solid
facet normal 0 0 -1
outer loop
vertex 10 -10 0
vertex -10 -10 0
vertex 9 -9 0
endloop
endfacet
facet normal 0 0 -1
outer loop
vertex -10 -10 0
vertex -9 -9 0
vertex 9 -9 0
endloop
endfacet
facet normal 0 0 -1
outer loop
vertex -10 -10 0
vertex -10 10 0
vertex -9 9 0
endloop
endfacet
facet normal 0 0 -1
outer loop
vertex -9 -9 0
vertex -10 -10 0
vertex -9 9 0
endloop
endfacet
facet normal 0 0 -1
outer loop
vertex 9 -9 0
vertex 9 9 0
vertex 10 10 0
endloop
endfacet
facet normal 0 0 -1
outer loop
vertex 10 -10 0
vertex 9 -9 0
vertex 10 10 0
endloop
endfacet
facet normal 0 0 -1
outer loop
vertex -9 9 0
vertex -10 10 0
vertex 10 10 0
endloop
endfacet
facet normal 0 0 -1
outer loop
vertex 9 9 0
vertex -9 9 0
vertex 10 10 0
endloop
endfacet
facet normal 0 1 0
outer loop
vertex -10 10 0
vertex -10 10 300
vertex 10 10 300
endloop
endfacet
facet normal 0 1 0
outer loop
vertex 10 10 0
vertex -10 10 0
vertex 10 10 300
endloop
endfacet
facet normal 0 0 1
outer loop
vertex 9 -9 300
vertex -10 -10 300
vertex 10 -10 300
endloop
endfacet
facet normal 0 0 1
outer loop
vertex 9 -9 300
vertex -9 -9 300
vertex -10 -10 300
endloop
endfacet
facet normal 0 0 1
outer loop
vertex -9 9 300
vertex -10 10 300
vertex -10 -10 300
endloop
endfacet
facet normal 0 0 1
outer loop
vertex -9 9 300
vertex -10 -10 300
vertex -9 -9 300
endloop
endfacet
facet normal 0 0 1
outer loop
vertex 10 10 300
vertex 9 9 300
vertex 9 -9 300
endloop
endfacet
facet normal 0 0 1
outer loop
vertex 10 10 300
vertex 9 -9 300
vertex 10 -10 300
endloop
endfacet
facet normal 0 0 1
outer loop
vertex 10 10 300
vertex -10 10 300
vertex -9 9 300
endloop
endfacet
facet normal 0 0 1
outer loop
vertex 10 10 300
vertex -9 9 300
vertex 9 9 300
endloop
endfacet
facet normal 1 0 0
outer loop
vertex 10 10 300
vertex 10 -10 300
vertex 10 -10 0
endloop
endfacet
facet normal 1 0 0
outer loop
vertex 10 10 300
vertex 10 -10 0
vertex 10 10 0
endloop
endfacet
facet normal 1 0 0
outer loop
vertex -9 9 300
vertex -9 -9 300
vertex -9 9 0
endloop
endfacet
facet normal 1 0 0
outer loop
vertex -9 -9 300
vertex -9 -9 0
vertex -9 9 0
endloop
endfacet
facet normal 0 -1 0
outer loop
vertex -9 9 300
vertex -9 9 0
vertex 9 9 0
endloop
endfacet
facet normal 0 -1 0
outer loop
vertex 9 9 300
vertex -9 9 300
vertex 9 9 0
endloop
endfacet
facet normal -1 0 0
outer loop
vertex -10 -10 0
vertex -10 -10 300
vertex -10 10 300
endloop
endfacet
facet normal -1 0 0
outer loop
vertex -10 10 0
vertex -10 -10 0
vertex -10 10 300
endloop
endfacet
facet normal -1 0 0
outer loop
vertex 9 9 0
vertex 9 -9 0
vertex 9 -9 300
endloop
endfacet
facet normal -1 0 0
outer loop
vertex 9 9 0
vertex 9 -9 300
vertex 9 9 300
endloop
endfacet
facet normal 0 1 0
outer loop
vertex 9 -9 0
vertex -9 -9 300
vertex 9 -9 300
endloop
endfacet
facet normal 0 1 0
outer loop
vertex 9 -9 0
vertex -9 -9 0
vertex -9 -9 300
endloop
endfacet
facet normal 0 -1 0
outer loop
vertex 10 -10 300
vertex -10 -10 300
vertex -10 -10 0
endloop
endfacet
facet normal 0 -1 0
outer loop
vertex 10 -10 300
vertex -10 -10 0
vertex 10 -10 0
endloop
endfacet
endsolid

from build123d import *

# Parameters (mm, degrees)
SKETCH_1_W      = 20
SKETCH_1_H      = 20
SKETCH_1_W_2    = 18
SKETCH_1_H_2    = 18
EXTRUDE_1_DEPTH = 150
SKETCH_2_W      = 20
SKETCH_2_H      = 20
SKETCH_2_W_2    = 18
SKETCH_2_H_2    = 18
EXTRUDE_2_DEPTH = 150


with BuildPart() as part:
    # 草图1 → 凸台-拉伸1 (new body)
    with BuildSketch(Plane.XY):
        Rectangle(SKETCH_1_W, SKETCH_1_H)
        Rectangle(SKETCH_1_W_2, SKETCH_1_H_2, mode=Mode.SUBTRACT)
    extrude(amount=EXTRUDE_1_DEPTH)

    # 草图2 → 凸台-拉伸2 (add)
    with BuildSketch(Plane.XY.offset(150)):
        Rectangle(SKETCH_2_W, SKETCH_2_H)
        Rectangle(SKETCH_2_W_2, SKETCH_2_H_2, mode=Mode.SUBTRACT)
    extrude(amount=EXTRUDE_2_DEPTH)


solid = part.part
